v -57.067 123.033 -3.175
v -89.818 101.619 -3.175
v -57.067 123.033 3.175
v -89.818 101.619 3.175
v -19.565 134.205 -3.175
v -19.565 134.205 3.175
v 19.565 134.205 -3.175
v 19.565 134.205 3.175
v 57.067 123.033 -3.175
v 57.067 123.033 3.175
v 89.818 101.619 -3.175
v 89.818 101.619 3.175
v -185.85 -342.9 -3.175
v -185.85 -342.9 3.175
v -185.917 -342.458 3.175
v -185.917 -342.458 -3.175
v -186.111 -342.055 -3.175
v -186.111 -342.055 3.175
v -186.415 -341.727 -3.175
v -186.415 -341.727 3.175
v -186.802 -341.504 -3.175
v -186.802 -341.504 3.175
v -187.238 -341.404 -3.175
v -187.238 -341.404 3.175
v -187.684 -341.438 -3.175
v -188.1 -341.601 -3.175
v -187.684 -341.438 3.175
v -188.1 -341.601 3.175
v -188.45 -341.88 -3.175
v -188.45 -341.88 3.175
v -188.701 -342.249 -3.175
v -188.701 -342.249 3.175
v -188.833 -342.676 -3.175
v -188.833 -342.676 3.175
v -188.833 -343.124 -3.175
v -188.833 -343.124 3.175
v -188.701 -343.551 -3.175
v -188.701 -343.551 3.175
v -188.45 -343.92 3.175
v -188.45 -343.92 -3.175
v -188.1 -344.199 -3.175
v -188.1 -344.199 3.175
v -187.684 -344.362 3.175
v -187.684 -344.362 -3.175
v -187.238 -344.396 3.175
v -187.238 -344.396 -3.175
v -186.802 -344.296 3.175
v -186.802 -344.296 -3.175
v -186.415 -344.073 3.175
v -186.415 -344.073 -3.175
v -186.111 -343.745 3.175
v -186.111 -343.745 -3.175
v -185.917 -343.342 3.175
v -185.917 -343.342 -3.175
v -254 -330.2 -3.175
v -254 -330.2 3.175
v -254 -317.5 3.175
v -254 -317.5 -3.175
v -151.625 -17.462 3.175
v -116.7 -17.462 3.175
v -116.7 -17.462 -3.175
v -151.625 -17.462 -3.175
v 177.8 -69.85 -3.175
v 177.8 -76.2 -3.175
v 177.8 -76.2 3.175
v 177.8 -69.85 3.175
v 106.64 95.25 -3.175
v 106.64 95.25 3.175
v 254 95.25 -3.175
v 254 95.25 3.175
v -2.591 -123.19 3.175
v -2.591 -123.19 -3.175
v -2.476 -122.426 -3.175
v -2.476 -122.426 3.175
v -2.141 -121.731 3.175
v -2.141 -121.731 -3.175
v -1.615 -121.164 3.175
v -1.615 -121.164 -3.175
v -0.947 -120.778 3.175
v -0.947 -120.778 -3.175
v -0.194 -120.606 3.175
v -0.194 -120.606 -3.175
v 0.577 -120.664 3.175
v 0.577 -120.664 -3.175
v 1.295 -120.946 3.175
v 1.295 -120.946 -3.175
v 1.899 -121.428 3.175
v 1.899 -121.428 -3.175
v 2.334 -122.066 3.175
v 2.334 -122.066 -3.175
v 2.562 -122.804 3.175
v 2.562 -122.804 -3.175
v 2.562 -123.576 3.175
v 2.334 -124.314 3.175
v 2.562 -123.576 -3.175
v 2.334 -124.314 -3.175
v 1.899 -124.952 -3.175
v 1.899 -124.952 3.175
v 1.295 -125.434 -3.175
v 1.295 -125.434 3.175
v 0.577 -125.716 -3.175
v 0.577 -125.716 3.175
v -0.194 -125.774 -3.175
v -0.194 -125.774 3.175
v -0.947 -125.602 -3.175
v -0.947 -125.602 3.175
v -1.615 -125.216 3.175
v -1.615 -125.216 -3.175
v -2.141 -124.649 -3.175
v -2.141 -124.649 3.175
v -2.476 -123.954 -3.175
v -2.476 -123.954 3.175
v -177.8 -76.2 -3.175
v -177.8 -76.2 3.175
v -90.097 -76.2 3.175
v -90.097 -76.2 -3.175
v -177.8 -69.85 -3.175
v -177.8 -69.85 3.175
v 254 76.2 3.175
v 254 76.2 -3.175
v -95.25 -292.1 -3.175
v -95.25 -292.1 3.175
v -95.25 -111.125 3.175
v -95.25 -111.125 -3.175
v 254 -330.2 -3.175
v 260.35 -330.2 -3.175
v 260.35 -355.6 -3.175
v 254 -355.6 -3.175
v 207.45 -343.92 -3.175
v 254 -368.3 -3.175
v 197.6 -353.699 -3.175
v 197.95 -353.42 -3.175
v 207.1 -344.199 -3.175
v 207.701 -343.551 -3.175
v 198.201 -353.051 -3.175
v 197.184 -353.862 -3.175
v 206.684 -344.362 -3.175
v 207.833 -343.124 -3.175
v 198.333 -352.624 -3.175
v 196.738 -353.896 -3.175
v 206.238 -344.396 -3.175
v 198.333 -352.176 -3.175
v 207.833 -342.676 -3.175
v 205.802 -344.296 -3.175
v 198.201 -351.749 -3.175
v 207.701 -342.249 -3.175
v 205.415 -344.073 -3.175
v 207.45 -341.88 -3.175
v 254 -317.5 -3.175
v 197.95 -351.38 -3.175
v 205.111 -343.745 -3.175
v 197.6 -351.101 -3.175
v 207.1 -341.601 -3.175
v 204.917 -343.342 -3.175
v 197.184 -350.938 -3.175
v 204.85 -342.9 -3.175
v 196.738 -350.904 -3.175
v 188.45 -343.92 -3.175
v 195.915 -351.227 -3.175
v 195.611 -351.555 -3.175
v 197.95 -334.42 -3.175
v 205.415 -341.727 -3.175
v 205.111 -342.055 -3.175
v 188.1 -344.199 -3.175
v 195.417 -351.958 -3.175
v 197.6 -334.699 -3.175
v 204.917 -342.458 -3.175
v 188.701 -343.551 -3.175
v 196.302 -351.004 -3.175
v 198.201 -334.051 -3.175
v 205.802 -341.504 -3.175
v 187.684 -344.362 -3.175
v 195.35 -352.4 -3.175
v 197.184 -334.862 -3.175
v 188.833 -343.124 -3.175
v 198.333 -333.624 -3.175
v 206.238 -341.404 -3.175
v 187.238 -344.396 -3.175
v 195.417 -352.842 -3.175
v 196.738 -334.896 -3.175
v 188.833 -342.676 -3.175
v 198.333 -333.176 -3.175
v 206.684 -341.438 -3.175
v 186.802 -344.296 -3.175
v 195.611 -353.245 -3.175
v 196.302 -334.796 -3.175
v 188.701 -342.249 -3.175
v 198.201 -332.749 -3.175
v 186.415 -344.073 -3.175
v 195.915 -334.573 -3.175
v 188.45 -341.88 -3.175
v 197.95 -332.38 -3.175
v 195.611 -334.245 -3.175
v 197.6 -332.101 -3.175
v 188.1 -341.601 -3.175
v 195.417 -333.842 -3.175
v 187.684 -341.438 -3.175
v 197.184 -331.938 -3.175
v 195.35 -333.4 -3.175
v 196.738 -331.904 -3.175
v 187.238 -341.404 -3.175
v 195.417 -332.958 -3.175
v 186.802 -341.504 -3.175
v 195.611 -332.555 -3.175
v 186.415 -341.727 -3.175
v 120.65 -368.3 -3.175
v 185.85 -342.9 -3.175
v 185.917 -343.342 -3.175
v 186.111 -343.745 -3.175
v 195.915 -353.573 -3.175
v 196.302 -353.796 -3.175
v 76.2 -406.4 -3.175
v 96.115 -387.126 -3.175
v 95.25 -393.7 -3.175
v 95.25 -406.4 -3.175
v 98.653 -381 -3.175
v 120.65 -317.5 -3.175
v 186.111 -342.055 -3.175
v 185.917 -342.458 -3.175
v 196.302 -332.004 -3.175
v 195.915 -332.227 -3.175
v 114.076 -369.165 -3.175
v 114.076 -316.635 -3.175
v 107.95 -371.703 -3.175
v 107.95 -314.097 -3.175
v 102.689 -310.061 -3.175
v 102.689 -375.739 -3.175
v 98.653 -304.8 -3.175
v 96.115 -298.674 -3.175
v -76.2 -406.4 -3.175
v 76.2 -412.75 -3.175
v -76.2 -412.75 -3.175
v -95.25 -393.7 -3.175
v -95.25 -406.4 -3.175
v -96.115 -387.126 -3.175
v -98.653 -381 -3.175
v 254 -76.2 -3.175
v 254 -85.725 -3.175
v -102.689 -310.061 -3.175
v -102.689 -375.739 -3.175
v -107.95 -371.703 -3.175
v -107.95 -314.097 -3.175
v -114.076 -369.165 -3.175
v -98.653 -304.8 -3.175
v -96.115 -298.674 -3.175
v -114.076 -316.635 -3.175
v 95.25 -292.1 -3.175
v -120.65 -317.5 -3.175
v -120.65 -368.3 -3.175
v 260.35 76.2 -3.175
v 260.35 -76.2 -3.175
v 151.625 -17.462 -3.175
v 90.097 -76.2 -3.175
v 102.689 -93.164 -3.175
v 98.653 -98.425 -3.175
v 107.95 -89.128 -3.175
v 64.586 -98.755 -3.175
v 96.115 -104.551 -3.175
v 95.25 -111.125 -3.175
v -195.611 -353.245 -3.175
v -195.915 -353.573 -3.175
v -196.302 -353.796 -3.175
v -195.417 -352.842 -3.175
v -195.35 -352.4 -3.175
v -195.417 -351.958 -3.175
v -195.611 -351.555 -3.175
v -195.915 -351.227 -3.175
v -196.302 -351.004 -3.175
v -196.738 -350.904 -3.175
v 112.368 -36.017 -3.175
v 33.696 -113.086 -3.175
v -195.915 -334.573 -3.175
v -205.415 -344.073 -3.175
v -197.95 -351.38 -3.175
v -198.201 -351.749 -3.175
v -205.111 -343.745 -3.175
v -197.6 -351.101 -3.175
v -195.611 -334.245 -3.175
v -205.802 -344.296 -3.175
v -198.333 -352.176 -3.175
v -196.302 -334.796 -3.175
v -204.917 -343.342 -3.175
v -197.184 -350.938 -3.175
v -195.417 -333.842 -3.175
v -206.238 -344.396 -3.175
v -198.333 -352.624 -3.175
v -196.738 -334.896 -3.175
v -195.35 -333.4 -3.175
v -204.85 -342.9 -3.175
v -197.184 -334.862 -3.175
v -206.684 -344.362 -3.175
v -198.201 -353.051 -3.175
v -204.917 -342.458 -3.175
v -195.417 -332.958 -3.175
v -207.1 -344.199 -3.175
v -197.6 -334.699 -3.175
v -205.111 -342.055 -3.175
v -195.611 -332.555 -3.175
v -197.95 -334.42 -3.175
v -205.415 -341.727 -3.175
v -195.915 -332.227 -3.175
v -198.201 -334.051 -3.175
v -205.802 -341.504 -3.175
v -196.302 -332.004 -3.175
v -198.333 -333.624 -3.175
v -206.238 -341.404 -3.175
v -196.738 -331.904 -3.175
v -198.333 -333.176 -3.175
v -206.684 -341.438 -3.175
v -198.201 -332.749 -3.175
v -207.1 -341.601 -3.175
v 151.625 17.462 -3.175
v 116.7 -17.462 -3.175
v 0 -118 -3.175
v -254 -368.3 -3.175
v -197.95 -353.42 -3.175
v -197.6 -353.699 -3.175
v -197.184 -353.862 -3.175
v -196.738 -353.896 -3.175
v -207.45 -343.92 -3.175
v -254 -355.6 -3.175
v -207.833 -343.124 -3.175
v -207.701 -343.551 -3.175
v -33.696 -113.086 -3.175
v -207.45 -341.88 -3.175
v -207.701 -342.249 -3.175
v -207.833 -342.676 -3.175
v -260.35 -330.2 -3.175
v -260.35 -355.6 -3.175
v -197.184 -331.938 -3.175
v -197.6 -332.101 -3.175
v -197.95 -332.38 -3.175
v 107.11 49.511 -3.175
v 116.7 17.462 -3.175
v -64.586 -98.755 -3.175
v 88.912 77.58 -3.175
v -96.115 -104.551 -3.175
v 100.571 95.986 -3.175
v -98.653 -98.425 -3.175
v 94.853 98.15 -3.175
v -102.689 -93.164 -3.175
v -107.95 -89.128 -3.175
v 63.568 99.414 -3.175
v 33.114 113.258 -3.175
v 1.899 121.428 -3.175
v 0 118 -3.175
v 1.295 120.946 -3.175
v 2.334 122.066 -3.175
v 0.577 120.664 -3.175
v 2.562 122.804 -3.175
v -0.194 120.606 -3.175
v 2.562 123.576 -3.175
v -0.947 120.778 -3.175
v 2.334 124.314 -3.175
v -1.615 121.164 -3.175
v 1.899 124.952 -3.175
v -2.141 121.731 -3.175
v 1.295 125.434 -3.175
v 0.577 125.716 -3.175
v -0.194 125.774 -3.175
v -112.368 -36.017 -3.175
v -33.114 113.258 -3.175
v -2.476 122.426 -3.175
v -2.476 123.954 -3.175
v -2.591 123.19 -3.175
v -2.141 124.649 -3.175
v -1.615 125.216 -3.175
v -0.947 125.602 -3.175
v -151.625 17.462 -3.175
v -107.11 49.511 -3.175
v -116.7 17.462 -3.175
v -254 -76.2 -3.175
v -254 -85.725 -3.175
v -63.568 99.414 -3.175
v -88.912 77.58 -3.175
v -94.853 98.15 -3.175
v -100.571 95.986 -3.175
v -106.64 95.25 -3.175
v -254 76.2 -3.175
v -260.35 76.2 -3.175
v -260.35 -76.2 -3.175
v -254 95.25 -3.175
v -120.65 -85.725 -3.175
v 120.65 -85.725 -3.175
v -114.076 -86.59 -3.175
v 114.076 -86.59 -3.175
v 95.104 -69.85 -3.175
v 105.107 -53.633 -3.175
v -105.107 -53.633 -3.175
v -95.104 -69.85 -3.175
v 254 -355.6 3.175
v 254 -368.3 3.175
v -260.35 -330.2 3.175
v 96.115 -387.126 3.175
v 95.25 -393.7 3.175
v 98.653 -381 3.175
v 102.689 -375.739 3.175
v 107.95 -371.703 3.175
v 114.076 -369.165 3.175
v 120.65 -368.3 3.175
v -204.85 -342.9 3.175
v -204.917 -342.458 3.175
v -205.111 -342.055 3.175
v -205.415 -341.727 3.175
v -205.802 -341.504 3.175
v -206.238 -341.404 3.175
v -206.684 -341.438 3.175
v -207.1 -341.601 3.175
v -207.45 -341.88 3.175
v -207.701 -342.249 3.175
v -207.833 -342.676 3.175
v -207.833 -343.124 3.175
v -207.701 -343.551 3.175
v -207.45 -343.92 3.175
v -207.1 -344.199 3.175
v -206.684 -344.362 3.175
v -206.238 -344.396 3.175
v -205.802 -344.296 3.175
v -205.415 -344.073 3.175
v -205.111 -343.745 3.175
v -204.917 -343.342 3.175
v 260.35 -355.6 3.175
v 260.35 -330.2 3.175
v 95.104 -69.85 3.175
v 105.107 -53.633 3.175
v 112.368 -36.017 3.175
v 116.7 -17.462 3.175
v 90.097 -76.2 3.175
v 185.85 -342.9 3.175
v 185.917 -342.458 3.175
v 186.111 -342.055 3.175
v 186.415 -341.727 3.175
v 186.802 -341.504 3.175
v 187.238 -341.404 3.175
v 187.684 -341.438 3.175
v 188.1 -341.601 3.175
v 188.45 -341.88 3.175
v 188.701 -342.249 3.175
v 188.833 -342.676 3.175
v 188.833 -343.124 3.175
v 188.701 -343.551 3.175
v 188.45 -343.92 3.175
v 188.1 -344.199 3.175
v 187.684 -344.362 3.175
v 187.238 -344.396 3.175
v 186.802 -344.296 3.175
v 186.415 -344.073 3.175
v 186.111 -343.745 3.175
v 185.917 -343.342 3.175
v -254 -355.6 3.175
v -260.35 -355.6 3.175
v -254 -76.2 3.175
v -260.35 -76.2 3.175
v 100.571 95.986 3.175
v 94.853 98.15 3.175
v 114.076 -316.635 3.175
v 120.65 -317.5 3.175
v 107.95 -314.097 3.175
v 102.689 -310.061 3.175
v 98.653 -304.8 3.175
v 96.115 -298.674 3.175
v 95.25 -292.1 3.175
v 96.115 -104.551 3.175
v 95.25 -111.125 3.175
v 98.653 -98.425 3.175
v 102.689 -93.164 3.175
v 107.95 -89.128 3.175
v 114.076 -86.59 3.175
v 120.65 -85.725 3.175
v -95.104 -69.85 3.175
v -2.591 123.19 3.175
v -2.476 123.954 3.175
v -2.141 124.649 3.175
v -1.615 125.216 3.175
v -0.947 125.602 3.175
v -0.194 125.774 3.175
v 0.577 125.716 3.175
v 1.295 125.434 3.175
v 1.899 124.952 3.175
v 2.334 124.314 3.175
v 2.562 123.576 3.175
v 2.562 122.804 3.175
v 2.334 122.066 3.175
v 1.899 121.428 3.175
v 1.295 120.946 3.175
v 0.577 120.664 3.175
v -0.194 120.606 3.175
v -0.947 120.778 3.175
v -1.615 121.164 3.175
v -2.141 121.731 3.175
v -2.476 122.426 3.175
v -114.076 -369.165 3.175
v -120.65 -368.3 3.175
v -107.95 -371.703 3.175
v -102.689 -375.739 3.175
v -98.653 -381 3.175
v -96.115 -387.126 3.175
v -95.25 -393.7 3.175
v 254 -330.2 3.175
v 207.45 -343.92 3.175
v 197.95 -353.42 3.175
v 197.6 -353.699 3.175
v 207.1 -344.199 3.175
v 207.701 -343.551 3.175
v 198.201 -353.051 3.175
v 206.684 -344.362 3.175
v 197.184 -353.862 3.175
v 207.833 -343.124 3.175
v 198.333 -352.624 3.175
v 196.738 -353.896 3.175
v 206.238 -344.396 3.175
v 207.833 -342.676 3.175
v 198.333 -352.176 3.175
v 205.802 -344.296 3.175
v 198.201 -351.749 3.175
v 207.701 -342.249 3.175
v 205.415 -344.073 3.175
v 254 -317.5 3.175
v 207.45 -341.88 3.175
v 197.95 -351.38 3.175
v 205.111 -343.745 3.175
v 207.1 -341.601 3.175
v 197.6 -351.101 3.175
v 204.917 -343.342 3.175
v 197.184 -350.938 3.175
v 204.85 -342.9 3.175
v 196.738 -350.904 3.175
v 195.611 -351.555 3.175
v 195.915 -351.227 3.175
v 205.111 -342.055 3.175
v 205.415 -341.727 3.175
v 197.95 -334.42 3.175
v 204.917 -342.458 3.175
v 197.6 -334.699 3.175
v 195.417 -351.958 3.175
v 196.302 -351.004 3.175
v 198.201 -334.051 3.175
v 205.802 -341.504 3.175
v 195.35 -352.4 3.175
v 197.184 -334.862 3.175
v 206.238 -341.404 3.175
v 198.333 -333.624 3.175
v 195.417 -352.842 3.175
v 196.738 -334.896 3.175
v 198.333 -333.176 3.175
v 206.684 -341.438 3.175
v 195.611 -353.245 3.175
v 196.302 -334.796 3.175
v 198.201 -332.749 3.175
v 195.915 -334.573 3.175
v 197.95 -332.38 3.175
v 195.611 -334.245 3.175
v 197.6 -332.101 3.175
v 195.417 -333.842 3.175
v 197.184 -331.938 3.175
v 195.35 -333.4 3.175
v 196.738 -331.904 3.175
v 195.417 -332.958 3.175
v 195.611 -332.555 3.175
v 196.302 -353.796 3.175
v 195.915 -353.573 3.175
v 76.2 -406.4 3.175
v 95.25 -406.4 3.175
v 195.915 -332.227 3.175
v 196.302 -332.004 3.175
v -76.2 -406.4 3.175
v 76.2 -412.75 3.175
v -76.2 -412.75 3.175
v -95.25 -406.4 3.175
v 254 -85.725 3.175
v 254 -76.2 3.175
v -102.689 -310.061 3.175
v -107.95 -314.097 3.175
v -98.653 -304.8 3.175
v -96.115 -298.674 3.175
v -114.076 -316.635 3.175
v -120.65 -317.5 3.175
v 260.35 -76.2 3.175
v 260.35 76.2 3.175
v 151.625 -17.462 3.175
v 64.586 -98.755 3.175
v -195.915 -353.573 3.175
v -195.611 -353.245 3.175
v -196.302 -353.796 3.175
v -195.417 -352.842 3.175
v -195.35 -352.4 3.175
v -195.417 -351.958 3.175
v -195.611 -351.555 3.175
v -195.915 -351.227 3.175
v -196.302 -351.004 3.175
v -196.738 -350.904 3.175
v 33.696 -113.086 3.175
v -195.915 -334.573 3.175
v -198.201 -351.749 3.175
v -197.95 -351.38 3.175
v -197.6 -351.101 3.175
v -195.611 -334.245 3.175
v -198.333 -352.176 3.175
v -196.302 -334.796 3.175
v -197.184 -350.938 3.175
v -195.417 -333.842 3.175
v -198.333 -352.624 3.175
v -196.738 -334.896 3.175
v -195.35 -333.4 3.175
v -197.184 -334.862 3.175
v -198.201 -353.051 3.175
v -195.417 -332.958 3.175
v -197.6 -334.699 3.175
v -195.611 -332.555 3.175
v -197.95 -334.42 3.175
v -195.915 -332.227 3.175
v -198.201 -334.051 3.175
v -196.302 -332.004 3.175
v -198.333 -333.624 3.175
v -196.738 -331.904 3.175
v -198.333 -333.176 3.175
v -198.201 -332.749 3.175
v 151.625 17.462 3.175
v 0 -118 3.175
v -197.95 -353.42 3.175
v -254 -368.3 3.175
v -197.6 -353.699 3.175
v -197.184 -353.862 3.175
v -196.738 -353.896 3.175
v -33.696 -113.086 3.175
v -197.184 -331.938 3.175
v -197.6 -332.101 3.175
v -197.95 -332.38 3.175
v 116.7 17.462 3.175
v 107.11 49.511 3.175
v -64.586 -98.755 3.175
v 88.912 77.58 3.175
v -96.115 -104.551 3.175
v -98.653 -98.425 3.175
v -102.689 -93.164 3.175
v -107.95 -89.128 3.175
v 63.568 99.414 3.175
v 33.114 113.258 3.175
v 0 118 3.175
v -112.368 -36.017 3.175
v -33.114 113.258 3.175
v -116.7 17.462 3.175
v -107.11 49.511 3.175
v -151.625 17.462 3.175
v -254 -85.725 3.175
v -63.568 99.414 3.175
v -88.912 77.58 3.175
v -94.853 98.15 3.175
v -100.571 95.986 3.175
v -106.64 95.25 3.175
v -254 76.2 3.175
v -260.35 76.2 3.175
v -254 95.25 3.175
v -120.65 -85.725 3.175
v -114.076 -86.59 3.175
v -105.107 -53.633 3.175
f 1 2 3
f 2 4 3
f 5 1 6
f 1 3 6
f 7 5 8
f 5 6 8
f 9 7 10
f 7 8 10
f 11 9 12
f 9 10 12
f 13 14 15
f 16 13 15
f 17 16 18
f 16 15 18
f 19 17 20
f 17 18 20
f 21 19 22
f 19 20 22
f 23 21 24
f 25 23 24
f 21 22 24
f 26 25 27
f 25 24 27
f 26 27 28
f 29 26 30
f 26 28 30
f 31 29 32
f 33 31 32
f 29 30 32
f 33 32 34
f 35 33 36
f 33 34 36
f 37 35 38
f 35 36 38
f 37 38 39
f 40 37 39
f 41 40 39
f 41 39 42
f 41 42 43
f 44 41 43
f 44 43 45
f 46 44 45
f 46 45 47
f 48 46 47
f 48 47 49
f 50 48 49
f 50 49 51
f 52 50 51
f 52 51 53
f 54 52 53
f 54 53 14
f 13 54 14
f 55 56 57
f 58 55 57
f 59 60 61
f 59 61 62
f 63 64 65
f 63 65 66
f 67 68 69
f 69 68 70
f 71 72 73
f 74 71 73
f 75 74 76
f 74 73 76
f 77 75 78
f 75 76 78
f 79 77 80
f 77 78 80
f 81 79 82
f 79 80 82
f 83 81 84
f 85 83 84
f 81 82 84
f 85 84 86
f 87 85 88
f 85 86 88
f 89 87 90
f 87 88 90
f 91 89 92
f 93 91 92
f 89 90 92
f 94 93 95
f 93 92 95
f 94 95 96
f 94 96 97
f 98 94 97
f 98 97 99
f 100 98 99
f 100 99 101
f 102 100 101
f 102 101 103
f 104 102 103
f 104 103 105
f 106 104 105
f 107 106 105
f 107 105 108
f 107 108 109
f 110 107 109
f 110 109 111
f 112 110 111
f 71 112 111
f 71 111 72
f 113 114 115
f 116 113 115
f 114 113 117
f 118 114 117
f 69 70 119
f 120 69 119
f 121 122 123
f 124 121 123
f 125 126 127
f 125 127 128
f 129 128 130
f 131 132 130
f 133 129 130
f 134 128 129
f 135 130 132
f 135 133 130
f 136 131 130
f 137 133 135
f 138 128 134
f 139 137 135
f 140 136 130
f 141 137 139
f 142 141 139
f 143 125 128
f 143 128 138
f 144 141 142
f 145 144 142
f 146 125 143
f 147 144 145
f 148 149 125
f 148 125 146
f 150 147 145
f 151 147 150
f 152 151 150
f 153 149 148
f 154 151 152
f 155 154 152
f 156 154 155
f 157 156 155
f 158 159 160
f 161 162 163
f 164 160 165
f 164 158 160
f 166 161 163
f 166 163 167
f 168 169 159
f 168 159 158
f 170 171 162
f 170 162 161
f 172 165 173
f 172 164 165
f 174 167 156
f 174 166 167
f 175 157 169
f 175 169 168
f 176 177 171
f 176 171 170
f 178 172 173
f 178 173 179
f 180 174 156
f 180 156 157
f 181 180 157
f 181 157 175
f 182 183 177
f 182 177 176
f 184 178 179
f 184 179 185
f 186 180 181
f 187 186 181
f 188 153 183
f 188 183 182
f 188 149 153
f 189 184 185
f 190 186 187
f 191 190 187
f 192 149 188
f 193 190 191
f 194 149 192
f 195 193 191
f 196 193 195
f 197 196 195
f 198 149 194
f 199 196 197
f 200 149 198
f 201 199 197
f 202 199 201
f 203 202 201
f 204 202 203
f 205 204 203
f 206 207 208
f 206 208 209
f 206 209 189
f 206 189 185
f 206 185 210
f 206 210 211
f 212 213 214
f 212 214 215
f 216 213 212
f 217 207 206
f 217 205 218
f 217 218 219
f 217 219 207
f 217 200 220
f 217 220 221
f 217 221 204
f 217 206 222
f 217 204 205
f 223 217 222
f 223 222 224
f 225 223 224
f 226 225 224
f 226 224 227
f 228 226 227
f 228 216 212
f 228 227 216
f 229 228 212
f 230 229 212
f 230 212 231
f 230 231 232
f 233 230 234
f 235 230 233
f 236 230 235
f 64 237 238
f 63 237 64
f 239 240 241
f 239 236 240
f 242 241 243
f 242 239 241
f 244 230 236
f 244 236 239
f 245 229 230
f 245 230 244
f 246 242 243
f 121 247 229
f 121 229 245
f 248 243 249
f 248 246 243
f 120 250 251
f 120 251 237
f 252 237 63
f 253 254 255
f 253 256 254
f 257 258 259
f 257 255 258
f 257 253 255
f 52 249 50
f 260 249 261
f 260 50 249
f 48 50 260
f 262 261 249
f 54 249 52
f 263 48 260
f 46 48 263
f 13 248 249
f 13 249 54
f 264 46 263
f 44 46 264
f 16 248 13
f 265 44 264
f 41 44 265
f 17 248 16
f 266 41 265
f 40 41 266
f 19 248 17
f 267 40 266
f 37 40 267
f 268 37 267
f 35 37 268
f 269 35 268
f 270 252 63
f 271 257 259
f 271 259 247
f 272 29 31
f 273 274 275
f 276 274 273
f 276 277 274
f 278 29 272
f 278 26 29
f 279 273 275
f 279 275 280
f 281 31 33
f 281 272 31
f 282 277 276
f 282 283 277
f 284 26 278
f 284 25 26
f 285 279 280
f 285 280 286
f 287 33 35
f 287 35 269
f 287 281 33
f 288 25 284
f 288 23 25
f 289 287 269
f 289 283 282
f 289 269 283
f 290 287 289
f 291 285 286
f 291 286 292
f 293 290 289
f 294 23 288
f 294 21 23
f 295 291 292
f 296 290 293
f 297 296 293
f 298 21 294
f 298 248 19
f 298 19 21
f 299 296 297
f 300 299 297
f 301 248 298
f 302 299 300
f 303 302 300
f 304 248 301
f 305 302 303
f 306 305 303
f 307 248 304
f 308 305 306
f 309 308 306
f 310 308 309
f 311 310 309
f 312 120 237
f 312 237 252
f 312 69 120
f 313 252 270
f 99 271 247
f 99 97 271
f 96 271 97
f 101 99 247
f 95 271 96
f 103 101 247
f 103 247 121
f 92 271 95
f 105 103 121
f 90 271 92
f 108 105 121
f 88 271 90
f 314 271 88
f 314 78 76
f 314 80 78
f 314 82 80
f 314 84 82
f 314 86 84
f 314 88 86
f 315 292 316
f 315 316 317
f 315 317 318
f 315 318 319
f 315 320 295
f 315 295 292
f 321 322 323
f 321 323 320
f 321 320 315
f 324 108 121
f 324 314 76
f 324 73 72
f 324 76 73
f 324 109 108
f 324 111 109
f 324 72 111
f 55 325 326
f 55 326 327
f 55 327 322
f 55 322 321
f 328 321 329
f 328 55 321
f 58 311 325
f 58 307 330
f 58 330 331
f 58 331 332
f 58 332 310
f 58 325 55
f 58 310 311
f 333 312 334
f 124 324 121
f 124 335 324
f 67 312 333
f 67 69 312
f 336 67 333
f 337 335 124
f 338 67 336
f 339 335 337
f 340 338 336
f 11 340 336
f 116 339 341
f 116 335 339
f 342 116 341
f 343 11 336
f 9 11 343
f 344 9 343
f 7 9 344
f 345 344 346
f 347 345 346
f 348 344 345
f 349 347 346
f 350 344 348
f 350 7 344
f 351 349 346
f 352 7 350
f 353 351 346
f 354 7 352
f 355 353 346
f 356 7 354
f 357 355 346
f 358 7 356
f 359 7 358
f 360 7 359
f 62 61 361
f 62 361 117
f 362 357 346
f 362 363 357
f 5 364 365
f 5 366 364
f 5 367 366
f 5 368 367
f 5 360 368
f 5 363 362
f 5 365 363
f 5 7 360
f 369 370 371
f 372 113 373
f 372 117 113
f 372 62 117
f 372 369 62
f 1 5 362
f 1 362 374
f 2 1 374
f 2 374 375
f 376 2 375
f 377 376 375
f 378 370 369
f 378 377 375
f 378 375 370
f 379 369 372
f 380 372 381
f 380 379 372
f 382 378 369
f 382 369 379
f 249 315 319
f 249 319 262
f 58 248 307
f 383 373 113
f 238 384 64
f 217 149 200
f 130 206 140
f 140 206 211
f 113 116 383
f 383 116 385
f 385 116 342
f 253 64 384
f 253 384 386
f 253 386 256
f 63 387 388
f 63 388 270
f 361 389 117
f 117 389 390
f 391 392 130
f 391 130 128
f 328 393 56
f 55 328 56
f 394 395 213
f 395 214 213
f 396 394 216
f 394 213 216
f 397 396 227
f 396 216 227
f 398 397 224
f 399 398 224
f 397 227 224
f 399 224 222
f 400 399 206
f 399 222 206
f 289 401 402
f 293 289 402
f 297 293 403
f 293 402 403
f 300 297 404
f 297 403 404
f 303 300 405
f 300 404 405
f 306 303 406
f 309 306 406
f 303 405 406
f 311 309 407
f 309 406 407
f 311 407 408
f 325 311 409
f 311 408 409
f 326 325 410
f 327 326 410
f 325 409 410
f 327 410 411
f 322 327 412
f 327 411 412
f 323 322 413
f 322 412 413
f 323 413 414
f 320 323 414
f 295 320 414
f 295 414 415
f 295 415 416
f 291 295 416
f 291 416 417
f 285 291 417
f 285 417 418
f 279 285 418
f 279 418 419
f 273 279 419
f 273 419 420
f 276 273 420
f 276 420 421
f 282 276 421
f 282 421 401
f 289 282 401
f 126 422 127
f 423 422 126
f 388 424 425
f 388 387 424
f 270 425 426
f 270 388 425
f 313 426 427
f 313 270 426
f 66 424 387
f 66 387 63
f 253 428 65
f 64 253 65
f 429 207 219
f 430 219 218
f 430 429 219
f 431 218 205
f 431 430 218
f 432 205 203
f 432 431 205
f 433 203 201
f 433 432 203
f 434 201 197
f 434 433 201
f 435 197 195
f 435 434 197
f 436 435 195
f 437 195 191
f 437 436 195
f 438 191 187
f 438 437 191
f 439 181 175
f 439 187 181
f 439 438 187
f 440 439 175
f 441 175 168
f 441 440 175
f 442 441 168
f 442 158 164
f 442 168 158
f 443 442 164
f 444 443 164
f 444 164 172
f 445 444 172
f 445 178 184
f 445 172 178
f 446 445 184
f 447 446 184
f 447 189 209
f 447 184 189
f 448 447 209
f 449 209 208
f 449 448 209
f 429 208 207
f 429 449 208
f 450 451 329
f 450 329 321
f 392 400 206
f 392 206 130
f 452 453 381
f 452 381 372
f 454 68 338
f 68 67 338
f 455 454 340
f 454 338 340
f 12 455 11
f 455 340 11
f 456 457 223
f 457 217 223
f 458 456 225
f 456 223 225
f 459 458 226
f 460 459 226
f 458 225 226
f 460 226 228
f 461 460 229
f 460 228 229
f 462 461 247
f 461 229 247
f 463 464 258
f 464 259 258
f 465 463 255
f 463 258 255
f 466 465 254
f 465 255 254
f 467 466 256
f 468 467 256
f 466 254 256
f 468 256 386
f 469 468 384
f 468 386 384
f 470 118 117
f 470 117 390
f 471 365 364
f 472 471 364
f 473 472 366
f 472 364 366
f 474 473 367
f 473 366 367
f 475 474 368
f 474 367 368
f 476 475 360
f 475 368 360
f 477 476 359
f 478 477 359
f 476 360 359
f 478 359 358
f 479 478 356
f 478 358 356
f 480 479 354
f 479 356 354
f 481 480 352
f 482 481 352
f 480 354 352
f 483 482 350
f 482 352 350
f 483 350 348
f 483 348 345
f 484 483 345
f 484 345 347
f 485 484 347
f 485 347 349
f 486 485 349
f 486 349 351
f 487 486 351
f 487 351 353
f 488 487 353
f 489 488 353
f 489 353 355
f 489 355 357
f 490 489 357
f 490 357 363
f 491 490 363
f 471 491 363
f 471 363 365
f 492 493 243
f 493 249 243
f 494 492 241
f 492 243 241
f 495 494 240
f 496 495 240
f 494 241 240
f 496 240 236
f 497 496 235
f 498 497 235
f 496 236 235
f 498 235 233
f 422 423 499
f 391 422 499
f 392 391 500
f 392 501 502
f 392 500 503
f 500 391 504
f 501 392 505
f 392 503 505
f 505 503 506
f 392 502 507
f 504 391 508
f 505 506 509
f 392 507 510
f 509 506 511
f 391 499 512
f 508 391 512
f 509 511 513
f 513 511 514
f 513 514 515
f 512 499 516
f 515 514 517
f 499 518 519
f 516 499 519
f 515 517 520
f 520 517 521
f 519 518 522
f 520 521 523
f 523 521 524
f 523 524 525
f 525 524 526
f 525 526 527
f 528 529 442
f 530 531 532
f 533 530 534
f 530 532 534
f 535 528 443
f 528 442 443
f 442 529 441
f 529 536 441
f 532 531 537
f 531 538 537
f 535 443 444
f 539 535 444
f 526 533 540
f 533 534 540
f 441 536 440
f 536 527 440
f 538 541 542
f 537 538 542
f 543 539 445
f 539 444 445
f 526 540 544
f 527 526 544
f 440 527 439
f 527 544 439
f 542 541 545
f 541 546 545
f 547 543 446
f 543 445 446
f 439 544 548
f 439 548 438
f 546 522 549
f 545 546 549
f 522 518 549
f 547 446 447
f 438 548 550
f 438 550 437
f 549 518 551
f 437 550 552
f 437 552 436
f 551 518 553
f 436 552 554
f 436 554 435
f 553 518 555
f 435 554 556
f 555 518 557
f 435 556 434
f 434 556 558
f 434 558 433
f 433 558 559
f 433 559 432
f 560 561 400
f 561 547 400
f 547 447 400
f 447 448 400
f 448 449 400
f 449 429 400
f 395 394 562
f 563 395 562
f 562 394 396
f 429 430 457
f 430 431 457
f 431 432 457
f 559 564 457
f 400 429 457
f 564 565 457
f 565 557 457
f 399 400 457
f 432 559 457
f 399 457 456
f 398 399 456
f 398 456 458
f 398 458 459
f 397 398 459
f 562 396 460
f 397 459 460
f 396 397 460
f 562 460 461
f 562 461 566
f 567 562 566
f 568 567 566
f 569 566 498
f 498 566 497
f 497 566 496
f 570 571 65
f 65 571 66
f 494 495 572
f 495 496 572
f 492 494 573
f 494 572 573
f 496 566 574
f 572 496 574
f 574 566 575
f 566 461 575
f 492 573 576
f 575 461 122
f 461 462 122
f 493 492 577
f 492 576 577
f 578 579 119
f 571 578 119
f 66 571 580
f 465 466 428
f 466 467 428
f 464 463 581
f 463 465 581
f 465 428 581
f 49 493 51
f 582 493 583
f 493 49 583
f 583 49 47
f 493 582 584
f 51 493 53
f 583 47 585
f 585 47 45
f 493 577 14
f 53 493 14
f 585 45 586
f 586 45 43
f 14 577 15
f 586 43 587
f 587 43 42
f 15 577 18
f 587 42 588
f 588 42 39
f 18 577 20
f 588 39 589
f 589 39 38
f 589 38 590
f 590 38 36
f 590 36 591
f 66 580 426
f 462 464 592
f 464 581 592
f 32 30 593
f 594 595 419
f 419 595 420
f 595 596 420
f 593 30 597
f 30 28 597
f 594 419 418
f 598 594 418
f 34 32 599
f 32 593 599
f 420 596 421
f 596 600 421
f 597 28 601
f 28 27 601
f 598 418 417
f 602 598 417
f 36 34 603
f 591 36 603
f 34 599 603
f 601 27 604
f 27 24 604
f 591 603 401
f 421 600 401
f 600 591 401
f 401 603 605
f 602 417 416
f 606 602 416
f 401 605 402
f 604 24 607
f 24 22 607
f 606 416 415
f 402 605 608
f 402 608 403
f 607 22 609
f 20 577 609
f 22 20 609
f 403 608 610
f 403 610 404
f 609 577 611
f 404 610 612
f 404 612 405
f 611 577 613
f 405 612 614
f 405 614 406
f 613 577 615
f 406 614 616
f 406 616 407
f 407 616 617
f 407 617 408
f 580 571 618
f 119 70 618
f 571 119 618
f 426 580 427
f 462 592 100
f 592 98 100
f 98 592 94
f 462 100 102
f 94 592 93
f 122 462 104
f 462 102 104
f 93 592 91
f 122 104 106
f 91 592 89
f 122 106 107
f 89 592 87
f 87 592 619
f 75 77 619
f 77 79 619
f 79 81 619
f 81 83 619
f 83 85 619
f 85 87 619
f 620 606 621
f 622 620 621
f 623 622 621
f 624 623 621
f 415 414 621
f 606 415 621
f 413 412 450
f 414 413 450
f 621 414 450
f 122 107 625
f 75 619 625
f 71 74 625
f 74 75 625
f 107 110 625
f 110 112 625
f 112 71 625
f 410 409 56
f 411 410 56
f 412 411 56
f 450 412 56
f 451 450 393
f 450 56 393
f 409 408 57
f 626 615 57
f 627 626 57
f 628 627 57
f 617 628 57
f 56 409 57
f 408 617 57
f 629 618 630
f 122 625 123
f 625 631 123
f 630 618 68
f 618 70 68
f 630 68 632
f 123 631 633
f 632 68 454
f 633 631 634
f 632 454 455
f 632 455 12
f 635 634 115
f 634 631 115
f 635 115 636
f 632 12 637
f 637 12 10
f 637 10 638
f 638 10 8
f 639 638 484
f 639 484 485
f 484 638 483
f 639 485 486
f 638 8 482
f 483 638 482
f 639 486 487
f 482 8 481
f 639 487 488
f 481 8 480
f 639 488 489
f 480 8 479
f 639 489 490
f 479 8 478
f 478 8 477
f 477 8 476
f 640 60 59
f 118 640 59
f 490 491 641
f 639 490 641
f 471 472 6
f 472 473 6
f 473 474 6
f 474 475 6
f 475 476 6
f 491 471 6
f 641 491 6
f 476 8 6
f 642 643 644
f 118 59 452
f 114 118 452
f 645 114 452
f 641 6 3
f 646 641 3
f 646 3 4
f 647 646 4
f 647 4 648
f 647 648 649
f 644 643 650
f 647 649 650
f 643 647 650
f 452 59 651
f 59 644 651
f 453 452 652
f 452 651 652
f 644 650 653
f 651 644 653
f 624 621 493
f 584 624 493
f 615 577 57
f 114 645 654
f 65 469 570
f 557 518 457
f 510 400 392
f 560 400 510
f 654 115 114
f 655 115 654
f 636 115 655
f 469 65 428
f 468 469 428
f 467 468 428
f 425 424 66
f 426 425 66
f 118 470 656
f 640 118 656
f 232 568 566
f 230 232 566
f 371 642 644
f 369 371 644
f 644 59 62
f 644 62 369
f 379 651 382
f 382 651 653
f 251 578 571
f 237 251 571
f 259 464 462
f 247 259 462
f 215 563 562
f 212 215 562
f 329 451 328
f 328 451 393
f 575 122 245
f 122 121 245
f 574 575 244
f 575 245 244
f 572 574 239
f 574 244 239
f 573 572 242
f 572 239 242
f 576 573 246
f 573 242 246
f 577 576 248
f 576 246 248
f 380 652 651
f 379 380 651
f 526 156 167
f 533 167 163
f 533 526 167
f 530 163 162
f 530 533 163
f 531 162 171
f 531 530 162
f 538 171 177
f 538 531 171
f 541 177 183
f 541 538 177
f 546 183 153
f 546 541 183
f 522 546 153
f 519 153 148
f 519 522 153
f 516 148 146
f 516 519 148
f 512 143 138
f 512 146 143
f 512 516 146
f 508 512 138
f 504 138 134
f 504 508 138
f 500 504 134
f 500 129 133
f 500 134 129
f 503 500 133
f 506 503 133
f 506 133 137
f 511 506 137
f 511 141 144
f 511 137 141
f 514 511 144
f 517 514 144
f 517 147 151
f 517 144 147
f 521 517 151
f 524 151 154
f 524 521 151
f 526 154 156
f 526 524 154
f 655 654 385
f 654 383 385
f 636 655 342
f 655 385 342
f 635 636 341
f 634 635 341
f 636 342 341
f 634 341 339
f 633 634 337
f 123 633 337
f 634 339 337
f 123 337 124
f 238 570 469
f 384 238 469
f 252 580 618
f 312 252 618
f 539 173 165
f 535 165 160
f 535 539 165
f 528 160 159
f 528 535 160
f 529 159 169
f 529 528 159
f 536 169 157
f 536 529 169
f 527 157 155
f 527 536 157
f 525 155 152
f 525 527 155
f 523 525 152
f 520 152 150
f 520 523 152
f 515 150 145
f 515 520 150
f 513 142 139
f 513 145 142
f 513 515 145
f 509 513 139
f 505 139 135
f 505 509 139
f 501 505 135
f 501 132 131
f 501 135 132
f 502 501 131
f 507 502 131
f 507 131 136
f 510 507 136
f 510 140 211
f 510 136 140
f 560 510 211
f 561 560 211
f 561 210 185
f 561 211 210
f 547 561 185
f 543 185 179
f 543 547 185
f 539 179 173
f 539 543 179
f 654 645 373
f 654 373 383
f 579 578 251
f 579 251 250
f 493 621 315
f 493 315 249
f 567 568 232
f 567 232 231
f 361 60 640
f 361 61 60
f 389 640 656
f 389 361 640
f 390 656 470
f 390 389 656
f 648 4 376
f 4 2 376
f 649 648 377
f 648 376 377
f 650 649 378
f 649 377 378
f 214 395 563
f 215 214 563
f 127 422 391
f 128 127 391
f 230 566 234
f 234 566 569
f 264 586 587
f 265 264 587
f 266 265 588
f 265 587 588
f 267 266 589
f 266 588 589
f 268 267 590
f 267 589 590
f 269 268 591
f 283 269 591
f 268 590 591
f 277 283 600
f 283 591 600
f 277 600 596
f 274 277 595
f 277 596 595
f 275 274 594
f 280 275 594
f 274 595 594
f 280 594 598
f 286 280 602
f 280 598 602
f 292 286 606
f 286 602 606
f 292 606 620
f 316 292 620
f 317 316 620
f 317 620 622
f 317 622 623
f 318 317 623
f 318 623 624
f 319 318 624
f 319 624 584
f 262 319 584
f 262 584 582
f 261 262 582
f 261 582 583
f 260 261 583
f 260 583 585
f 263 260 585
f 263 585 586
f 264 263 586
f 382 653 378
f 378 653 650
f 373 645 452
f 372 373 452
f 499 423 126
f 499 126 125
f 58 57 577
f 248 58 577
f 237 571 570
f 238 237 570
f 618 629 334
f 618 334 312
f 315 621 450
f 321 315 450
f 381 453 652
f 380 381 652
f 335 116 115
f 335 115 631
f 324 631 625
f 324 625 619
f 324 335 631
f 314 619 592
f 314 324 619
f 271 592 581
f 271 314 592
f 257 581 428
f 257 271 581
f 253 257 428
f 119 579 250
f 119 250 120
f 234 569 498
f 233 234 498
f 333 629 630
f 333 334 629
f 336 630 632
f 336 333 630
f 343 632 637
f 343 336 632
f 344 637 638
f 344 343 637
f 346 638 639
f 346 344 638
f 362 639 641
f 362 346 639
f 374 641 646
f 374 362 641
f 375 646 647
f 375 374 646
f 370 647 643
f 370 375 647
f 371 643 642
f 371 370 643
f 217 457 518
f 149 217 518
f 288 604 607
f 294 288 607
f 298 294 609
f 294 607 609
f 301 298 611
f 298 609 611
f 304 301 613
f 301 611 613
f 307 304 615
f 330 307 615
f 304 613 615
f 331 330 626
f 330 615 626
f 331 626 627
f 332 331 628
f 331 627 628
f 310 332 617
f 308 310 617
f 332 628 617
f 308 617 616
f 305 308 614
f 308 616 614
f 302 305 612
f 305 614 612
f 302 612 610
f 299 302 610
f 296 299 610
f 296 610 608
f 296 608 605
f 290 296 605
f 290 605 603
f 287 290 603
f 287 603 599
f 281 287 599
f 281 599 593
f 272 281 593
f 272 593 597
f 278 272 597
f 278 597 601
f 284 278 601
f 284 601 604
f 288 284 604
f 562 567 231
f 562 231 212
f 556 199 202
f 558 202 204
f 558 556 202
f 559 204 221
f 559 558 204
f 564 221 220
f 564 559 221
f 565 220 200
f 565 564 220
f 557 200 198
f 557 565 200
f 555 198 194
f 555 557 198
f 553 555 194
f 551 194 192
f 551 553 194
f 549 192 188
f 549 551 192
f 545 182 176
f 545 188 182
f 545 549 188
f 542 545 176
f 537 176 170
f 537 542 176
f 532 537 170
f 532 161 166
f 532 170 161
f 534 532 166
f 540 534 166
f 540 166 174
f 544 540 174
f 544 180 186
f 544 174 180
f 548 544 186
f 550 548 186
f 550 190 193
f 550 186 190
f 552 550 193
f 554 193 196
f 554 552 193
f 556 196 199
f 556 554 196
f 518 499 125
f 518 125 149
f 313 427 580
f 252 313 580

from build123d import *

# Parameters (mm, degrees)
MAIN_BODY_SKETCH_R     = 117.99951
MAIN_BODY_DEPTH        = 3.175
TABS_SKETCH_W          = 6.35
TABS_SKETCH_H          = 152.4
TABS_SKETCH_W_2        = 152.4
TABS_SKETCH_H_2        = 6.35
OUTSIDE_TABS_DEPTH     = 6.35
F_6_0_204_TUBE_MOUNT_D = 5.1816
SKETCH12_W             = 165.1
SKETCH12_H             = 50.8
BOSS_EXTRUDE1_DEPTH    = 6.35
SKETCH13_R             = 1.5
CUT_EXTRUDE1_DEPTH     = 489.042014073
SKETCH14_W             = 6.35
SKETCH14_H             = 12.7
CUT_EXTRUDE2_DEPTH     = 489.042014073
SKETCH15_W             = 87.70313901
SKETCH15_H             = 6.35
CUT_EXTRUDE3_DEPTH     = 489.042014073
SKETCH16_W             = 34.925
SKETCH16_H             = 34.925
CUT_EXTRUDE4_DEPTH     = 489.042014073
SKETCH17_W             = 158.75
SKETCH17_H             = 10.820932089
CUT_EXTRUDE5_DEPTH     = 489.042014073
FILLET1_R              = 25.4


with BuildPart() as part:
    # Main Body Sketch → Main Body (new, symmetric)
    with BuildSketch(Plane.XY):
        with BuildLine():
            Line((-96.545932089, -95.25), (-254, -95.25))
            Line((-254, -95.25), (-254, 95.25))
            Line((-254, 95.25), (-96.545932089, 95.25))
            ThreePointArc((-96.545932089, 95.25), (0, 135.6233), (96.545932089, 95.25))
            Line((96.545932089, 95.25), (254, 95.25))
            Line((254, 95.25), (254, -95.25))
            Line((254, -95.25), (96.545932089, -95.25))
            ThreePointArc((96.545932089, -95.25), (95.900155117, -95.900155117), (95.25, -96.545932089))
            Line((95.25, -96.545932089), (95.25, -406.4))
            Line((95.25, -406.4), (-95.25, -406.4))
            Line((-95.25, -406.4), (-95.25, -96.545932089))
            ThreePointArc((-95.25, -96.545932089), (-95.900155117, -95.900155117), (-96.545932089, -95.25))
        make_face()
        Circle(MAIN_BODY_SKETCH_R, mode=Mode.SUBTRACT)
    extrude(amount=MAIN_BODY_DEPTH, both=True)

    # Tabs Sketch → Outside Tabs (add)
    with BuildSketch(Plane.XY.offset(3.175)):
        with Locations((-257.175, 0)):
            Rectangle(TABS_SKETCH_W, TABS_SKETCH_H)
        with Locations((0, -409.575)):
            Rectangle(TABS_SKETCH_W_2, TABS_SKETCH_H_2)
    outside_tabs = extrude(amount=-OUTSIDE_TABS_DEPTH)

    # Outside Tabs Mirror: Outside Tabs across plane
    add(outside_tabs.mirror(Plane(origin=(0, 0, 0), x_dir=(0, 0, 1), z_dir=(1, 0, 0))))

    # #6 (0.204) Tube Mount (through all)
    with Locations(Plane.XY.offset(3.175)):
        with Locations((0, -123.19), (123.19, 0), (0, 123.19), (-123.19, 0)):
            Hole(F_6_0_204_TUBE_MOUNT_D / 2)

    # Sketch12 → Boss-Extrude1 (add)
    with BuildSketch(Plane.XY.offset(3.175)):
        with Locations((-177.8, -342.9)):
            Rectangle(SKETCH12_W, SKETCH12_H)
        with Locations((177.8, -342.9)):
            Rectangle(SKETCH12_W, SKETCH12_H)
    extrude(amount=-BOSS_EXTRUDE1_DEPTH)

    # Sketch13 → Cut-Extrude1 (cut, through all)
    with BuildSketch(Plane.XY.offset(3.175)):
        with Locations((-196.85, -333.4)):
            Circle(SKETCH13_R)
        with Locations((-187.35, -342.9)):
            Circle(SKETCH13_R)
        with Locations((-196.85, -352.4)):
            Circle(SKETCH13_R)
        with Locations((-206.35, -342.9)):
            Circle(SKETCH13_R)
    cut_extrude1 = extrude(amount=-CUT_EXTRUDE1_DEPTH, mode=Mode.SUBTRACT)

    # Mirror2: Cut-Extrude1 across plane
    add(cut_extrude1.mirror(Plane(origin=(0, 0, 0), x_dir=(0, 0, 1), z_dir=(1, 0, 0))), mode=Mode.SUBTRACT)

    # Sketch14 → Cut-Extrude2 (cut, through all)
    with BuildSketch(Plane.XY.offset(3.175)):
        with Locations((-257.175, -323.85)):
            Rectangle(SKETCH14_W, SKETCH14_H)
        with Locations((-257.175, -361.95)):
            Rectangle(SKETCH14_W, SKETCH14_H)
    cut_extrude2 = extrude(amount=-CUT_EXTRUDE2_DEPTH, mode=Mode.SUBTRACT)

    # Mirror3: Cut-Extrude2 across plane
    add(cut_extrude2.mirror(Plane(origin=(0, 0, 0), x_dir=(0, 0, 1), z_dir=(1, 0, 0))), mode=Mode.SUBTRACT)

    # Sketch15 → Cut-Extrude3 (cut, through all)
    with BuildSketch(Plane.XY.offset(3.175)):
        with Locations((-133.948430495, -73.025)):
            Rectangle(SKETCH15_W, SKETCH15_H)
        with Locations((133.948430495, -73.025)):
            Rectangle(SKETCH15_W, SKETCH15_H)
    extrude(amount=-CUT_EXTRUDE3_DEPTH, mode=Mode.SUBTRACT)

    # Sketch16 → Cut-Extrude4 (cut, through all)
    with BuildSketch(Plane.XY.offset(3.175)):
        with Locations((134.162737592, 0)):
            Rectangle(SKETCH16_W, SKETCH16_H)
    cut_extrude4 = extrude(amount=-CUT_EXTRUDE4_DEPTH, mode=Mode.SUBTRACT)

    # Mirror4: Cut-Extrude4 across plane
    add(cut_extrude4.mirror(Plane(origin=(0, 0, 0), x_dir=(0, 0, 1), z_dir=(1, 0, 0))), mode=Mode.SUBTRACT)

    # Sketch17 → Cut-Extrude5 (cut, through all)
    with BuildSketch(Plane.XY.offset(3.175)):
        with Locations((-174.625, -91.135466045)):
            Rectangle(SKETCH17_W, SKETCH17_H)
    cut_extrude5 = extrude(amount=-CUT_EXTRUDE5_DEPTH, mode=Mode.SUBTRACT)

    # Mirror5: Cut-Extrude5 across plane
    add(cut_extrude5.mirror(Plane(origin=(0, 0, 0), x_dir=(0, 0, 1), z_dir=(1, 0, 0))), mode=Mode.SUBTRACT)

    # Fillet1
    fillet1_edges = [part.edges().sort_by_distance(p)[0] for p in [
        (-95.25, -317.5, 0),
        (-95.25, -368.3, 0),
        (95.25, -317.5, 0),
        (95.25, -368.3, 0),
        (-96.545932089, 95.25, 0),
        (96.545932089, 95.25, 0),
        (-95.25, -85.725, 0),
        (95.25, -85.725, 0),
    ]]
    fillet(fillet1_edges, radius=FILLET1_R)


solid = part.part
